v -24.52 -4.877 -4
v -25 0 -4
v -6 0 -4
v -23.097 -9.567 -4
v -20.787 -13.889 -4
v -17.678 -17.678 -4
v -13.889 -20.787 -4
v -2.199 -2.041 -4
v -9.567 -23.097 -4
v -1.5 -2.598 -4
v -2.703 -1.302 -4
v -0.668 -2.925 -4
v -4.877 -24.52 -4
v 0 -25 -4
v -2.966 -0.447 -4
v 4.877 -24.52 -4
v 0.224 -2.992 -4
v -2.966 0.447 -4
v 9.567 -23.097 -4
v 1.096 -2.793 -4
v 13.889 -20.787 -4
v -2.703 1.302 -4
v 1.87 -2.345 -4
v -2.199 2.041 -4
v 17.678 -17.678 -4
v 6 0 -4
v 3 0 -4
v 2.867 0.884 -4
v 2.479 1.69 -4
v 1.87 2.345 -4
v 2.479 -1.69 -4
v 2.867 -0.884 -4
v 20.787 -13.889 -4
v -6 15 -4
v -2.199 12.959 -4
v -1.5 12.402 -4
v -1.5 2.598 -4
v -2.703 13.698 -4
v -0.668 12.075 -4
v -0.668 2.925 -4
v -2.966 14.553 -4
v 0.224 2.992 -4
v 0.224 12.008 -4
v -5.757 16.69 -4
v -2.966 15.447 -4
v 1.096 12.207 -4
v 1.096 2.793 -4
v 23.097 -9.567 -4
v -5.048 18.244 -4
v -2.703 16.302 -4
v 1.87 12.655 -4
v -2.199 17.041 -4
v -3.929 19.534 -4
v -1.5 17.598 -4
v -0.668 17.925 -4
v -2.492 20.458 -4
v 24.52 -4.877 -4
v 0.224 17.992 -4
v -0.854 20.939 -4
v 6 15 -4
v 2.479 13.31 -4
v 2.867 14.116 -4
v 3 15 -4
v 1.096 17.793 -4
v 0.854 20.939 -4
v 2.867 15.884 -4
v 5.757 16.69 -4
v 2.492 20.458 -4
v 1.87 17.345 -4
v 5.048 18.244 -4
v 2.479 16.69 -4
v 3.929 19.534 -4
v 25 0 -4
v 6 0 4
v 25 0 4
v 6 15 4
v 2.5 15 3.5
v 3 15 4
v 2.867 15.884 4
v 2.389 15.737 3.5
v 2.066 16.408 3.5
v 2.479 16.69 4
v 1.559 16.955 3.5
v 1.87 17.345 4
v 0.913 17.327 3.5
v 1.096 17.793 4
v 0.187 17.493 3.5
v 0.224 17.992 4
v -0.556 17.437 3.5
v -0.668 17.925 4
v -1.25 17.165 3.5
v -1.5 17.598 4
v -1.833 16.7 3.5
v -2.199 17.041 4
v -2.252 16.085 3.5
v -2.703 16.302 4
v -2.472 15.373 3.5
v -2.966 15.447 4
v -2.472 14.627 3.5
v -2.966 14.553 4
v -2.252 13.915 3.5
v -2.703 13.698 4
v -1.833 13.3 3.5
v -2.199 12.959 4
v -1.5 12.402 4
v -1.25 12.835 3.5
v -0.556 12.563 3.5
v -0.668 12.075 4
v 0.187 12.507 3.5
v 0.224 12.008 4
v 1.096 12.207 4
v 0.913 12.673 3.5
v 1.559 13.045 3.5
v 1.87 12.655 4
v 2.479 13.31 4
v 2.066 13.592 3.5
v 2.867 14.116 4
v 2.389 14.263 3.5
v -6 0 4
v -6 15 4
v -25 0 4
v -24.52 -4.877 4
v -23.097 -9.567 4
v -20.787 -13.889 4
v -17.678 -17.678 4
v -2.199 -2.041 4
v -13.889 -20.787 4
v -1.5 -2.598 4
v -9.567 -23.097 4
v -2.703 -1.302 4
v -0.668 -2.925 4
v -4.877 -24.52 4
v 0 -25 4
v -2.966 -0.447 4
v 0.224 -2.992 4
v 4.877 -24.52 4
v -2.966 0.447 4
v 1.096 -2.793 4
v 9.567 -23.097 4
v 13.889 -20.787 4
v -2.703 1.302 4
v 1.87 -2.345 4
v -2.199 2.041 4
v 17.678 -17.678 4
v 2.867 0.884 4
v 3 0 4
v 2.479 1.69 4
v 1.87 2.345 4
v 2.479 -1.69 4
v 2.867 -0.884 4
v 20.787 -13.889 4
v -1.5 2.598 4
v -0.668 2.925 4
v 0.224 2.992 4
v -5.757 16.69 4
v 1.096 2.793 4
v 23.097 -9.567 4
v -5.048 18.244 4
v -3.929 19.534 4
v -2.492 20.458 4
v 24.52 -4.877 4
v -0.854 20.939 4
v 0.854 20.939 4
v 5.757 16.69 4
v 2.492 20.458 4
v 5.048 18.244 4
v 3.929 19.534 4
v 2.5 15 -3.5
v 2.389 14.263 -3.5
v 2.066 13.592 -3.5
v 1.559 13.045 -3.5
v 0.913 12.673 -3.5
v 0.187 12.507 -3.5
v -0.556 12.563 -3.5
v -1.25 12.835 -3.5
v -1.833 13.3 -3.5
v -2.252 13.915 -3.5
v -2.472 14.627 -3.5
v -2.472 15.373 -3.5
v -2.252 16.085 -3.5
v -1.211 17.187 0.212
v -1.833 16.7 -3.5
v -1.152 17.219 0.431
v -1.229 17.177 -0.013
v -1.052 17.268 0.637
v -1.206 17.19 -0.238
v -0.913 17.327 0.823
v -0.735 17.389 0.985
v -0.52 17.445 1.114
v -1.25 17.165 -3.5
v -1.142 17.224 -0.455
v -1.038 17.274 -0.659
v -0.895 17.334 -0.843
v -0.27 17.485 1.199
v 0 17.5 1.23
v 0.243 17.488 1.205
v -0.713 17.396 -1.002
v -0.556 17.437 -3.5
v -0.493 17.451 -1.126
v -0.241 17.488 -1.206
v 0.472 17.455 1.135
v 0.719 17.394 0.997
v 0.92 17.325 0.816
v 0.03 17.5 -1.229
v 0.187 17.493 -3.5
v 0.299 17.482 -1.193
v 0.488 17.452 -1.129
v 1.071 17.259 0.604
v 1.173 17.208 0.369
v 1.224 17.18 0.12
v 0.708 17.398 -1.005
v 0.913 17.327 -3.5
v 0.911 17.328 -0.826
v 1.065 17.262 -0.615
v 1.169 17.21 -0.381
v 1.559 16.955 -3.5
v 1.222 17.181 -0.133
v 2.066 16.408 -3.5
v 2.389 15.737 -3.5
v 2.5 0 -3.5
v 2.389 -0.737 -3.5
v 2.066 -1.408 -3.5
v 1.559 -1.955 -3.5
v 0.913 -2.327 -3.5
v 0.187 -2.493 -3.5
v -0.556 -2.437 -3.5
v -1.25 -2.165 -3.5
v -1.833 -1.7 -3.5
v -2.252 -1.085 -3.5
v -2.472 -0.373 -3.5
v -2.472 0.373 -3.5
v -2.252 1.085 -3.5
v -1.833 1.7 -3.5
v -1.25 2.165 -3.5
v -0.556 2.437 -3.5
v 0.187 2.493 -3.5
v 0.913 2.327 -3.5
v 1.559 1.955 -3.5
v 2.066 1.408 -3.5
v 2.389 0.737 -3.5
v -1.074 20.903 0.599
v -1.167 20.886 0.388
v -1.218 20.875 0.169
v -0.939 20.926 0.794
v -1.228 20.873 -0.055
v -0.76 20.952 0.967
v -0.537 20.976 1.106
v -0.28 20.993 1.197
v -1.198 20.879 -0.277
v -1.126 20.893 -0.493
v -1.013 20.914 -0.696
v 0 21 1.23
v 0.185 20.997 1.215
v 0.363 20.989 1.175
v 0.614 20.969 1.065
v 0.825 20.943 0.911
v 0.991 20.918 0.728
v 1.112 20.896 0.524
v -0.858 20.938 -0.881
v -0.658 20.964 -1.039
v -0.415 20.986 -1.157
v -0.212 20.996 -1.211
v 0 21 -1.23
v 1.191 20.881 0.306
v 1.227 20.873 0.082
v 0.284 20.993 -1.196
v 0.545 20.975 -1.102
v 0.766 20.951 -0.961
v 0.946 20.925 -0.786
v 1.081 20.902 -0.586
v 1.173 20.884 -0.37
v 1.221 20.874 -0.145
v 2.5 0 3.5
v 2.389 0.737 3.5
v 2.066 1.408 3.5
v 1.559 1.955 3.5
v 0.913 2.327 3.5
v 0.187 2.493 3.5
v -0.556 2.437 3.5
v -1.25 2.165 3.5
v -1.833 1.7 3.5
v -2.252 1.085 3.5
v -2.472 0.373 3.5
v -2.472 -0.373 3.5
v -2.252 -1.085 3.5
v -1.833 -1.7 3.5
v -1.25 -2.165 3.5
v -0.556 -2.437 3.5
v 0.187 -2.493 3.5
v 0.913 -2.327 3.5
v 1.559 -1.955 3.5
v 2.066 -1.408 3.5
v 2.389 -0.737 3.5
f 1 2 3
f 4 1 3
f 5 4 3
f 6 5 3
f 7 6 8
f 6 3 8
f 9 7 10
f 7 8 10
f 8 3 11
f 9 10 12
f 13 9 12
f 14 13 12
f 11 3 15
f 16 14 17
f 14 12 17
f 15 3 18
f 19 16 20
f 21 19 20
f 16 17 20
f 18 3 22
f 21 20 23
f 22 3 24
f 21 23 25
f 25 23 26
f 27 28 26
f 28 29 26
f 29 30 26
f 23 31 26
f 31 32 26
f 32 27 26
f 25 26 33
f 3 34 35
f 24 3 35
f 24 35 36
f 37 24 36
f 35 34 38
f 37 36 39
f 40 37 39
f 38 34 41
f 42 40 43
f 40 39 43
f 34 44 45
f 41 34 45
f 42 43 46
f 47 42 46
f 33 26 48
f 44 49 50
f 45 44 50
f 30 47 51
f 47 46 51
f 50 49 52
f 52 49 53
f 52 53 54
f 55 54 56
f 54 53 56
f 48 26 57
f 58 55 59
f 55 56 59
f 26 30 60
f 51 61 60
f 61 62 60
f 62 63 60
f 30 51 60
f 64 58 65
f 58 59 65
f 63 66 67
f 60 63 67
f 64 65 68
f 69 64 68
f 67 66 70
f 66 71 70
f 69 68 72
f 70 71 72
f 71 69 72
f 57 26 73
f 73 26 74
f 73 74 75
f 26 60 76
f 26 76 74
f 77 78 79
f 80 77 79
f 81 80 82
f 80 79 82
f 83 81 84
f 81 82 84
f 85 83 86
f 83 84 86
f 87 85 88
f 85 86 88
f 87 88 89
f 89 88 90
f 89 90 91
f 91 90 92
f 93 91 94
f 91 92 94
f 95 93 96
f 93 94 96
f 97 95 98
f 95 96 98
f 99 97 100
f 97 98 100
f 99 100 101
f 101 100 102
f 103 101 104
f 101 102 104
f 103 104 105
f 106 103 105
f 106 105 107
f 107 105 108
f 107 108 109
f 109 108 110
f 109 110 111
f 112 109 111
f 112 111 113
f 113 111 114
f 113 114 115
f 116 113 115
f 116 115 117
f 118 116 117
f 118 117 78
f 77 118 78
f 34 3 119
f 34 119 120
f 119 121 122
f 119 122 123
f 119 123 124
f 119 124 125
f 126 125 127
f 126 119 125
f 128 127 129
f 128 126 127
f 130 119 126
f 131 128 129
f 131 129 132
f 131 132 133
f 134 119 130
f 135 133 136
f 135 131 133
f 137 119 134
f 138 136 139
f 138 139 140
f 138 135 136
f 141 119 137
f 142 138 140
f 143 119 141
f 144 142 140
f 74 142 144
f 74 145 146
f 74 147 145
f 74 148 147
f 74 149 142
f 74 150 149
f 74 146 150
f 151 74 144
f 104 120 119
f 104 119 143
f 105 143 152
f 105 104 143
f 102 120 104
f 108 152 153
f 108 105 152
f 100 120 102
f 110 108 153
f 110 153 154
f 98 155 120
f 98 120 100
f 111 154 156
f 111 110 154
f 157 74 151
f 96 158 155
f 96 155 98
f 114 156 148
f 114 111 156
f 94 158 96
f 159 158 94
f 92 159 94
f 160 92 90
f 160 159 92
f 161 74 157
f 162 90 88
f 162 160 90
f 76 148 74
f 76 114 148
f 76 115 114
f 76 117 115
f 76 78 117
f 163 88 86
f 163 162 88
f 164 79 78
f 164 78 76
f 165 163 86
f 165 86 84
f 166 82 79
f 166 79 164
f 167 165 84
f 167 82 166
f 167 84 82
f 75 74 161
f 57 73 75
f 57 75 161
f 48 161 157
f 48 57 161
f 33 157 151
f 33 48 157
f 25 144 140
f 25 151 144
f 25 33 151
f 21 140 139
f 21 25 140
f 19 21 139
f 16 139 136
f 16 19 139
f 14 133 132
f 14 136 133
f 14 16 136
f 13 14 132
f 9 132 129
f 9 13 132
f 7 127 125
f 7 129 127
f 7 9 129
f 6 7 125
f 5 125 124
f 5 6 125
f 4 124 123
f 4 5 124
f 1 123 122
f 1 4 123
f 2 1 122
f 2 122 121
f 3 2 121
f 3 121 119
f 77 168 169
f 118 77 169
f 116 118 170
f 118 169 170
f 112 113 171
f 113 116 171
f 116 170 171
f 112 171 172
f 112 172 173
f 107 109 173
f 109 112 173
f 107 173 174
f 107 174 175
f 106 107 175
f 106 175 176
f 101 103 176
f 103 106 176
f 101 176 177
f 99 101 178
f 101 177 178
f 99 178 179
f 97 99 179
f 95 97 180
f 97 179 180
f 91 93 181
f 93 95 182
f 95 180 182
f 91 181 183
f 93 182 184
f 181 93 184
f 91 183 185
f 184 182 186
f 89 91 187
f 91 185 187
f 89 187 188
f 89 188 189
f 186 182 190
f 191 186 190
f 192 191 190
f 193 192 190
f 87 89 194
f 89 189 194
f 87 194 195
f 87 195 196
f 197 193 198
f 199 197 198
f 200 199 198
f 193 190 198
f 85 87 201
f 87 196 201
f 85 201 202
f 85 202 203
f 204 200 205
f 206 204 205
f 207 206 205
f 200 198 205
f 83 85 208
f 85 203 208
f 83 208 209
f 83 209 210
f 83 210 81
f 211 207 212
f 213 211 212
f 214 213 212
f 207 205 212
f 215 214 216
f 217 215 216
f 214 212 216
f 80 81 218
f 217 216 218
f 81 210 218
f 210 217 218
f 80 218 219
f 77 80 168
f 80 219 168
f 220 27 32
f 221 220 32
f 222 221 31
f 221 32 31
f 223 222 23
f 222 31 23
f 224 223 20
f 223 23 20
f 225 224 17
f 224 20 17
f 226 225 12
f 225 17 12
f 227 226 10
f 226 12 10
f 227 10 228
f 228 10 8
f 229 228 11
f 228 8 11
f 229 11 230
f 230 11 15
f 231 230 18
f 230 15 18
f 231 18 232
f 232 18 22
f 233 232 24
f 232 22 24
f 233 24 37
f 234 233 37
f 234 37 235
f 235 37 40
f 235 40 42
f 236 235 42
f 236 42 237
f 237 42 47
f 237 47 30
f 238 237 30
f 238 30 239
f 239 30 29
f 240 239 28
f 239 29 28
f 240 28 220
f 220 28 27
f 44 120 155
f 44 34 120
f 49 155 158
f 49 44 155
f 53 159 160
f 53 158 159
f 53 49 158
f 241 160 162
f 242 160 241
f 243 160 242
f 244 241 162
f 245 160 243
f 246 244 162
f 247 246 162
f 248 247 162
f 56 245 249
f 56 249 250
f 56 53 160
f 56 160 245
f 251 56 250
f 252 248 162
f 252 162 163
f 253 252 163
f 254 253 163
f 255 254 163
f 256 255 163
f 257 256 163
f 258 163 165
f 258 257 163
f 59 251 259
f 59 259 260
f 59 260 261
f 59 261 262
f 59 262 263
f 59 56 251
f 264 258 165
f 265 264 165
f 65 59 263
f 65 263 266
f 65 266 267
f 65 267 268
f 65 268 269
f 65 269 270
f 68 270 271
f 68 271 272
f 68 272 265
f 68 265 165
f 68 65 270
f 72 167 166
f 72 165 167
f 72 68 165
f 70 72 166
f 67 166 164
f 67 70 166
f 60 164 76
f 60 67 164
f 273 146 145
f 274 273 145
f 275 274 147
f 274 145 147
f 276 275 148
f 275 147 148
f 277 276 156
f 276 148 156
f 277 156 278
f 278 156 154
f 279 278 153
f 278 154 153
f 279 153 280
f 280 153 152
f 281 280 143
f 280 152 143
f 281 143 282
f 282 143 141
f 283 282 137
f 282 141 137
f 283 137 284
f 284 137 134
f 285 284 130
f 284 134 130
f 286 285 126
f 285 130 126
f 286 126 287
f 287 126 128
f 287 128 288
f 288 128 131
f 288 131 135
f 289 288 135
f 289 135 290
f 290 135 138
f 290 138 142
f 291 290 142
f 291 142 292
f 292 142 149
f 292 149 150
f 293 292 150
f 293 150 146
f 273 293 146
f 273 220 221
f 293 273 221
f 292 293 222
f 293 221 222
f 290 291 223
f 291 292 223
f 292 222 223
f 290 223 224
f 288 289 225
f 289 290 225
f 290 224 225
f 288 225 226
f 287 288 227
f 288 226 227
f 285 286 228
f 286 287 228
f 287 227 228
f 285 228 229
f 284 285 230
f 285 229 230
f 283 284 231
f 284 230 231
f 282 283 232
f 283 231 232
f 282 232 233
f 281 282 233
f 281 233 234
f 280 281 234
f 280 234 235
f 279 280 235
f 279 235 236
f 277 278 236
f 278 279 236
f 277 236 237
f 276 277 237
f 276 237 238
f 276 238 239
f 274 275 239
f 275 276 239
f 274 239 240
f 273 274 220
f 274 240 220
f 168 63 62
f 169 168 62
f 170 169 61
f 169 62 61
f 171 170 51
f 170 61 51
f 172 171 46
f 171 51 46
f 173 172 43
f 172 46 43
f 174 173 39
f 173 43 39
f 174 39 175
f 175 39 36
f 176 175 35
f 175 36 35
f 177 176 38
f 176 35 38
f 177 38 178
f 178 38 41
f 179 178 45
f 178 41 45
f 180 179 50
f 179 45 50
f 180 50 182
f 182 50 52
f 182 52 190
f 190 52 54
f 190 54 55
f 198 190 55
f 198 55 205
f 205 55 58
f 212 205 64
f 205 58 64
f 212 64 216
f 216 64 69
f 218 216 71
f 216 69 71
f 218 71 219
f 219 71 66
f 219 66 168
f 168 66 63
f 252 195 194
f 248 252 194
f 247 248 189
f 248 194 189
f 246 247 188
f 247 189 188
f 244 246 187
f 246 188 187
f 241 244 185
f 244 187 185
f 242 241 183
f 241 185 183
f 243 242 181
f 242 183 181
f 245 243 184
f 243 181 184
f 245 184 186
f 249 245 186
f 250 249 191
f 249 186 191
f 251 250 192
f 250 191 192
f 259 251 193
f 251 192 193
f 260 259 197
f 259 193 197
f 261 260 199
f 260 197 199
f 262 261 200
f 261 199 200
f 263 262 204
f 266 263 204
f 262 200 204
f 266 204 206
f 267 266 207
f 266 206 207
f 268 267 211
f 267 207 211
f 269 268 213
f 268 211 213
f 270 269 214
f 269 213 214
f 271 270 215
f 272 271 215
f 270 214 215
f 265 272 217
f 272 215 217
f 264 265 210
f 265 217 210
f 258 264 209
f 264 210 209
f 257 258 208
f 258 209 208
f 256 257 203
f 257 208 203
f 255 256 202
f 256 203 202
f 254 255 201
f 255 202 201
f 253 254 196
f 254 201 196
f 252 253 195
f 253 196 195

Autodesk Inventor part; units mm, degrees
ref_plane "YZ Plane" through (0, 0, 0) normal (1, 0, 0) x (0, 1, 0)
ref_plane "XZ Plane" through (0, 0, 0) normal (0, 1, 0) x (-1, 0, 0)
ref_plane "XY Plane" through (0, 0, 0) normal (0, 0, 1) x (1, 0, 0)
sketch "Sketch1" plane through (0, 0, 0) normal (0, 0, 1) x (1, 0, 0)
  arc A0 (-25, 0) -> (25, 0) centre (0, 0) ccw
  circle A1 centre (0, 0) radius 2.5
  circle A2 centre (0, 15) radius 2.5
  line L0 (-25, 0) -> (-6, 0)
  line L1 (-6, 0) -> (-6, 15)
  arc A3 (6, 15) -> (-6, 15) centre (0, 15) ccw
  line L2 (6, 15) -> (6, 0)
  line L3 (6, 0) -> (25, 0)
  point P0 (0, 21)
  dimension "d0" = 50
  dimension "d1" = 5
  dimension "d2" = 15
  dimension "d4" = 12
extrude "Extrusion1" add sketch "Sketch1" along normal mid plane 8
hole "Hole1" at (0, 21, 0) direction (0, -1, 0) diameter 2.459 end up to surface thread size "M3x0.5" class "6H" standard "ISO Metric profile"
chamfer "Chamfer1" distance 0.5 angle 45 4 edges at (-2.5, 15, 4) (-2.5, 0, 4) (-2.5, 0, -4) (-2.5, 15, -4)
properties part number "Counterweight"
